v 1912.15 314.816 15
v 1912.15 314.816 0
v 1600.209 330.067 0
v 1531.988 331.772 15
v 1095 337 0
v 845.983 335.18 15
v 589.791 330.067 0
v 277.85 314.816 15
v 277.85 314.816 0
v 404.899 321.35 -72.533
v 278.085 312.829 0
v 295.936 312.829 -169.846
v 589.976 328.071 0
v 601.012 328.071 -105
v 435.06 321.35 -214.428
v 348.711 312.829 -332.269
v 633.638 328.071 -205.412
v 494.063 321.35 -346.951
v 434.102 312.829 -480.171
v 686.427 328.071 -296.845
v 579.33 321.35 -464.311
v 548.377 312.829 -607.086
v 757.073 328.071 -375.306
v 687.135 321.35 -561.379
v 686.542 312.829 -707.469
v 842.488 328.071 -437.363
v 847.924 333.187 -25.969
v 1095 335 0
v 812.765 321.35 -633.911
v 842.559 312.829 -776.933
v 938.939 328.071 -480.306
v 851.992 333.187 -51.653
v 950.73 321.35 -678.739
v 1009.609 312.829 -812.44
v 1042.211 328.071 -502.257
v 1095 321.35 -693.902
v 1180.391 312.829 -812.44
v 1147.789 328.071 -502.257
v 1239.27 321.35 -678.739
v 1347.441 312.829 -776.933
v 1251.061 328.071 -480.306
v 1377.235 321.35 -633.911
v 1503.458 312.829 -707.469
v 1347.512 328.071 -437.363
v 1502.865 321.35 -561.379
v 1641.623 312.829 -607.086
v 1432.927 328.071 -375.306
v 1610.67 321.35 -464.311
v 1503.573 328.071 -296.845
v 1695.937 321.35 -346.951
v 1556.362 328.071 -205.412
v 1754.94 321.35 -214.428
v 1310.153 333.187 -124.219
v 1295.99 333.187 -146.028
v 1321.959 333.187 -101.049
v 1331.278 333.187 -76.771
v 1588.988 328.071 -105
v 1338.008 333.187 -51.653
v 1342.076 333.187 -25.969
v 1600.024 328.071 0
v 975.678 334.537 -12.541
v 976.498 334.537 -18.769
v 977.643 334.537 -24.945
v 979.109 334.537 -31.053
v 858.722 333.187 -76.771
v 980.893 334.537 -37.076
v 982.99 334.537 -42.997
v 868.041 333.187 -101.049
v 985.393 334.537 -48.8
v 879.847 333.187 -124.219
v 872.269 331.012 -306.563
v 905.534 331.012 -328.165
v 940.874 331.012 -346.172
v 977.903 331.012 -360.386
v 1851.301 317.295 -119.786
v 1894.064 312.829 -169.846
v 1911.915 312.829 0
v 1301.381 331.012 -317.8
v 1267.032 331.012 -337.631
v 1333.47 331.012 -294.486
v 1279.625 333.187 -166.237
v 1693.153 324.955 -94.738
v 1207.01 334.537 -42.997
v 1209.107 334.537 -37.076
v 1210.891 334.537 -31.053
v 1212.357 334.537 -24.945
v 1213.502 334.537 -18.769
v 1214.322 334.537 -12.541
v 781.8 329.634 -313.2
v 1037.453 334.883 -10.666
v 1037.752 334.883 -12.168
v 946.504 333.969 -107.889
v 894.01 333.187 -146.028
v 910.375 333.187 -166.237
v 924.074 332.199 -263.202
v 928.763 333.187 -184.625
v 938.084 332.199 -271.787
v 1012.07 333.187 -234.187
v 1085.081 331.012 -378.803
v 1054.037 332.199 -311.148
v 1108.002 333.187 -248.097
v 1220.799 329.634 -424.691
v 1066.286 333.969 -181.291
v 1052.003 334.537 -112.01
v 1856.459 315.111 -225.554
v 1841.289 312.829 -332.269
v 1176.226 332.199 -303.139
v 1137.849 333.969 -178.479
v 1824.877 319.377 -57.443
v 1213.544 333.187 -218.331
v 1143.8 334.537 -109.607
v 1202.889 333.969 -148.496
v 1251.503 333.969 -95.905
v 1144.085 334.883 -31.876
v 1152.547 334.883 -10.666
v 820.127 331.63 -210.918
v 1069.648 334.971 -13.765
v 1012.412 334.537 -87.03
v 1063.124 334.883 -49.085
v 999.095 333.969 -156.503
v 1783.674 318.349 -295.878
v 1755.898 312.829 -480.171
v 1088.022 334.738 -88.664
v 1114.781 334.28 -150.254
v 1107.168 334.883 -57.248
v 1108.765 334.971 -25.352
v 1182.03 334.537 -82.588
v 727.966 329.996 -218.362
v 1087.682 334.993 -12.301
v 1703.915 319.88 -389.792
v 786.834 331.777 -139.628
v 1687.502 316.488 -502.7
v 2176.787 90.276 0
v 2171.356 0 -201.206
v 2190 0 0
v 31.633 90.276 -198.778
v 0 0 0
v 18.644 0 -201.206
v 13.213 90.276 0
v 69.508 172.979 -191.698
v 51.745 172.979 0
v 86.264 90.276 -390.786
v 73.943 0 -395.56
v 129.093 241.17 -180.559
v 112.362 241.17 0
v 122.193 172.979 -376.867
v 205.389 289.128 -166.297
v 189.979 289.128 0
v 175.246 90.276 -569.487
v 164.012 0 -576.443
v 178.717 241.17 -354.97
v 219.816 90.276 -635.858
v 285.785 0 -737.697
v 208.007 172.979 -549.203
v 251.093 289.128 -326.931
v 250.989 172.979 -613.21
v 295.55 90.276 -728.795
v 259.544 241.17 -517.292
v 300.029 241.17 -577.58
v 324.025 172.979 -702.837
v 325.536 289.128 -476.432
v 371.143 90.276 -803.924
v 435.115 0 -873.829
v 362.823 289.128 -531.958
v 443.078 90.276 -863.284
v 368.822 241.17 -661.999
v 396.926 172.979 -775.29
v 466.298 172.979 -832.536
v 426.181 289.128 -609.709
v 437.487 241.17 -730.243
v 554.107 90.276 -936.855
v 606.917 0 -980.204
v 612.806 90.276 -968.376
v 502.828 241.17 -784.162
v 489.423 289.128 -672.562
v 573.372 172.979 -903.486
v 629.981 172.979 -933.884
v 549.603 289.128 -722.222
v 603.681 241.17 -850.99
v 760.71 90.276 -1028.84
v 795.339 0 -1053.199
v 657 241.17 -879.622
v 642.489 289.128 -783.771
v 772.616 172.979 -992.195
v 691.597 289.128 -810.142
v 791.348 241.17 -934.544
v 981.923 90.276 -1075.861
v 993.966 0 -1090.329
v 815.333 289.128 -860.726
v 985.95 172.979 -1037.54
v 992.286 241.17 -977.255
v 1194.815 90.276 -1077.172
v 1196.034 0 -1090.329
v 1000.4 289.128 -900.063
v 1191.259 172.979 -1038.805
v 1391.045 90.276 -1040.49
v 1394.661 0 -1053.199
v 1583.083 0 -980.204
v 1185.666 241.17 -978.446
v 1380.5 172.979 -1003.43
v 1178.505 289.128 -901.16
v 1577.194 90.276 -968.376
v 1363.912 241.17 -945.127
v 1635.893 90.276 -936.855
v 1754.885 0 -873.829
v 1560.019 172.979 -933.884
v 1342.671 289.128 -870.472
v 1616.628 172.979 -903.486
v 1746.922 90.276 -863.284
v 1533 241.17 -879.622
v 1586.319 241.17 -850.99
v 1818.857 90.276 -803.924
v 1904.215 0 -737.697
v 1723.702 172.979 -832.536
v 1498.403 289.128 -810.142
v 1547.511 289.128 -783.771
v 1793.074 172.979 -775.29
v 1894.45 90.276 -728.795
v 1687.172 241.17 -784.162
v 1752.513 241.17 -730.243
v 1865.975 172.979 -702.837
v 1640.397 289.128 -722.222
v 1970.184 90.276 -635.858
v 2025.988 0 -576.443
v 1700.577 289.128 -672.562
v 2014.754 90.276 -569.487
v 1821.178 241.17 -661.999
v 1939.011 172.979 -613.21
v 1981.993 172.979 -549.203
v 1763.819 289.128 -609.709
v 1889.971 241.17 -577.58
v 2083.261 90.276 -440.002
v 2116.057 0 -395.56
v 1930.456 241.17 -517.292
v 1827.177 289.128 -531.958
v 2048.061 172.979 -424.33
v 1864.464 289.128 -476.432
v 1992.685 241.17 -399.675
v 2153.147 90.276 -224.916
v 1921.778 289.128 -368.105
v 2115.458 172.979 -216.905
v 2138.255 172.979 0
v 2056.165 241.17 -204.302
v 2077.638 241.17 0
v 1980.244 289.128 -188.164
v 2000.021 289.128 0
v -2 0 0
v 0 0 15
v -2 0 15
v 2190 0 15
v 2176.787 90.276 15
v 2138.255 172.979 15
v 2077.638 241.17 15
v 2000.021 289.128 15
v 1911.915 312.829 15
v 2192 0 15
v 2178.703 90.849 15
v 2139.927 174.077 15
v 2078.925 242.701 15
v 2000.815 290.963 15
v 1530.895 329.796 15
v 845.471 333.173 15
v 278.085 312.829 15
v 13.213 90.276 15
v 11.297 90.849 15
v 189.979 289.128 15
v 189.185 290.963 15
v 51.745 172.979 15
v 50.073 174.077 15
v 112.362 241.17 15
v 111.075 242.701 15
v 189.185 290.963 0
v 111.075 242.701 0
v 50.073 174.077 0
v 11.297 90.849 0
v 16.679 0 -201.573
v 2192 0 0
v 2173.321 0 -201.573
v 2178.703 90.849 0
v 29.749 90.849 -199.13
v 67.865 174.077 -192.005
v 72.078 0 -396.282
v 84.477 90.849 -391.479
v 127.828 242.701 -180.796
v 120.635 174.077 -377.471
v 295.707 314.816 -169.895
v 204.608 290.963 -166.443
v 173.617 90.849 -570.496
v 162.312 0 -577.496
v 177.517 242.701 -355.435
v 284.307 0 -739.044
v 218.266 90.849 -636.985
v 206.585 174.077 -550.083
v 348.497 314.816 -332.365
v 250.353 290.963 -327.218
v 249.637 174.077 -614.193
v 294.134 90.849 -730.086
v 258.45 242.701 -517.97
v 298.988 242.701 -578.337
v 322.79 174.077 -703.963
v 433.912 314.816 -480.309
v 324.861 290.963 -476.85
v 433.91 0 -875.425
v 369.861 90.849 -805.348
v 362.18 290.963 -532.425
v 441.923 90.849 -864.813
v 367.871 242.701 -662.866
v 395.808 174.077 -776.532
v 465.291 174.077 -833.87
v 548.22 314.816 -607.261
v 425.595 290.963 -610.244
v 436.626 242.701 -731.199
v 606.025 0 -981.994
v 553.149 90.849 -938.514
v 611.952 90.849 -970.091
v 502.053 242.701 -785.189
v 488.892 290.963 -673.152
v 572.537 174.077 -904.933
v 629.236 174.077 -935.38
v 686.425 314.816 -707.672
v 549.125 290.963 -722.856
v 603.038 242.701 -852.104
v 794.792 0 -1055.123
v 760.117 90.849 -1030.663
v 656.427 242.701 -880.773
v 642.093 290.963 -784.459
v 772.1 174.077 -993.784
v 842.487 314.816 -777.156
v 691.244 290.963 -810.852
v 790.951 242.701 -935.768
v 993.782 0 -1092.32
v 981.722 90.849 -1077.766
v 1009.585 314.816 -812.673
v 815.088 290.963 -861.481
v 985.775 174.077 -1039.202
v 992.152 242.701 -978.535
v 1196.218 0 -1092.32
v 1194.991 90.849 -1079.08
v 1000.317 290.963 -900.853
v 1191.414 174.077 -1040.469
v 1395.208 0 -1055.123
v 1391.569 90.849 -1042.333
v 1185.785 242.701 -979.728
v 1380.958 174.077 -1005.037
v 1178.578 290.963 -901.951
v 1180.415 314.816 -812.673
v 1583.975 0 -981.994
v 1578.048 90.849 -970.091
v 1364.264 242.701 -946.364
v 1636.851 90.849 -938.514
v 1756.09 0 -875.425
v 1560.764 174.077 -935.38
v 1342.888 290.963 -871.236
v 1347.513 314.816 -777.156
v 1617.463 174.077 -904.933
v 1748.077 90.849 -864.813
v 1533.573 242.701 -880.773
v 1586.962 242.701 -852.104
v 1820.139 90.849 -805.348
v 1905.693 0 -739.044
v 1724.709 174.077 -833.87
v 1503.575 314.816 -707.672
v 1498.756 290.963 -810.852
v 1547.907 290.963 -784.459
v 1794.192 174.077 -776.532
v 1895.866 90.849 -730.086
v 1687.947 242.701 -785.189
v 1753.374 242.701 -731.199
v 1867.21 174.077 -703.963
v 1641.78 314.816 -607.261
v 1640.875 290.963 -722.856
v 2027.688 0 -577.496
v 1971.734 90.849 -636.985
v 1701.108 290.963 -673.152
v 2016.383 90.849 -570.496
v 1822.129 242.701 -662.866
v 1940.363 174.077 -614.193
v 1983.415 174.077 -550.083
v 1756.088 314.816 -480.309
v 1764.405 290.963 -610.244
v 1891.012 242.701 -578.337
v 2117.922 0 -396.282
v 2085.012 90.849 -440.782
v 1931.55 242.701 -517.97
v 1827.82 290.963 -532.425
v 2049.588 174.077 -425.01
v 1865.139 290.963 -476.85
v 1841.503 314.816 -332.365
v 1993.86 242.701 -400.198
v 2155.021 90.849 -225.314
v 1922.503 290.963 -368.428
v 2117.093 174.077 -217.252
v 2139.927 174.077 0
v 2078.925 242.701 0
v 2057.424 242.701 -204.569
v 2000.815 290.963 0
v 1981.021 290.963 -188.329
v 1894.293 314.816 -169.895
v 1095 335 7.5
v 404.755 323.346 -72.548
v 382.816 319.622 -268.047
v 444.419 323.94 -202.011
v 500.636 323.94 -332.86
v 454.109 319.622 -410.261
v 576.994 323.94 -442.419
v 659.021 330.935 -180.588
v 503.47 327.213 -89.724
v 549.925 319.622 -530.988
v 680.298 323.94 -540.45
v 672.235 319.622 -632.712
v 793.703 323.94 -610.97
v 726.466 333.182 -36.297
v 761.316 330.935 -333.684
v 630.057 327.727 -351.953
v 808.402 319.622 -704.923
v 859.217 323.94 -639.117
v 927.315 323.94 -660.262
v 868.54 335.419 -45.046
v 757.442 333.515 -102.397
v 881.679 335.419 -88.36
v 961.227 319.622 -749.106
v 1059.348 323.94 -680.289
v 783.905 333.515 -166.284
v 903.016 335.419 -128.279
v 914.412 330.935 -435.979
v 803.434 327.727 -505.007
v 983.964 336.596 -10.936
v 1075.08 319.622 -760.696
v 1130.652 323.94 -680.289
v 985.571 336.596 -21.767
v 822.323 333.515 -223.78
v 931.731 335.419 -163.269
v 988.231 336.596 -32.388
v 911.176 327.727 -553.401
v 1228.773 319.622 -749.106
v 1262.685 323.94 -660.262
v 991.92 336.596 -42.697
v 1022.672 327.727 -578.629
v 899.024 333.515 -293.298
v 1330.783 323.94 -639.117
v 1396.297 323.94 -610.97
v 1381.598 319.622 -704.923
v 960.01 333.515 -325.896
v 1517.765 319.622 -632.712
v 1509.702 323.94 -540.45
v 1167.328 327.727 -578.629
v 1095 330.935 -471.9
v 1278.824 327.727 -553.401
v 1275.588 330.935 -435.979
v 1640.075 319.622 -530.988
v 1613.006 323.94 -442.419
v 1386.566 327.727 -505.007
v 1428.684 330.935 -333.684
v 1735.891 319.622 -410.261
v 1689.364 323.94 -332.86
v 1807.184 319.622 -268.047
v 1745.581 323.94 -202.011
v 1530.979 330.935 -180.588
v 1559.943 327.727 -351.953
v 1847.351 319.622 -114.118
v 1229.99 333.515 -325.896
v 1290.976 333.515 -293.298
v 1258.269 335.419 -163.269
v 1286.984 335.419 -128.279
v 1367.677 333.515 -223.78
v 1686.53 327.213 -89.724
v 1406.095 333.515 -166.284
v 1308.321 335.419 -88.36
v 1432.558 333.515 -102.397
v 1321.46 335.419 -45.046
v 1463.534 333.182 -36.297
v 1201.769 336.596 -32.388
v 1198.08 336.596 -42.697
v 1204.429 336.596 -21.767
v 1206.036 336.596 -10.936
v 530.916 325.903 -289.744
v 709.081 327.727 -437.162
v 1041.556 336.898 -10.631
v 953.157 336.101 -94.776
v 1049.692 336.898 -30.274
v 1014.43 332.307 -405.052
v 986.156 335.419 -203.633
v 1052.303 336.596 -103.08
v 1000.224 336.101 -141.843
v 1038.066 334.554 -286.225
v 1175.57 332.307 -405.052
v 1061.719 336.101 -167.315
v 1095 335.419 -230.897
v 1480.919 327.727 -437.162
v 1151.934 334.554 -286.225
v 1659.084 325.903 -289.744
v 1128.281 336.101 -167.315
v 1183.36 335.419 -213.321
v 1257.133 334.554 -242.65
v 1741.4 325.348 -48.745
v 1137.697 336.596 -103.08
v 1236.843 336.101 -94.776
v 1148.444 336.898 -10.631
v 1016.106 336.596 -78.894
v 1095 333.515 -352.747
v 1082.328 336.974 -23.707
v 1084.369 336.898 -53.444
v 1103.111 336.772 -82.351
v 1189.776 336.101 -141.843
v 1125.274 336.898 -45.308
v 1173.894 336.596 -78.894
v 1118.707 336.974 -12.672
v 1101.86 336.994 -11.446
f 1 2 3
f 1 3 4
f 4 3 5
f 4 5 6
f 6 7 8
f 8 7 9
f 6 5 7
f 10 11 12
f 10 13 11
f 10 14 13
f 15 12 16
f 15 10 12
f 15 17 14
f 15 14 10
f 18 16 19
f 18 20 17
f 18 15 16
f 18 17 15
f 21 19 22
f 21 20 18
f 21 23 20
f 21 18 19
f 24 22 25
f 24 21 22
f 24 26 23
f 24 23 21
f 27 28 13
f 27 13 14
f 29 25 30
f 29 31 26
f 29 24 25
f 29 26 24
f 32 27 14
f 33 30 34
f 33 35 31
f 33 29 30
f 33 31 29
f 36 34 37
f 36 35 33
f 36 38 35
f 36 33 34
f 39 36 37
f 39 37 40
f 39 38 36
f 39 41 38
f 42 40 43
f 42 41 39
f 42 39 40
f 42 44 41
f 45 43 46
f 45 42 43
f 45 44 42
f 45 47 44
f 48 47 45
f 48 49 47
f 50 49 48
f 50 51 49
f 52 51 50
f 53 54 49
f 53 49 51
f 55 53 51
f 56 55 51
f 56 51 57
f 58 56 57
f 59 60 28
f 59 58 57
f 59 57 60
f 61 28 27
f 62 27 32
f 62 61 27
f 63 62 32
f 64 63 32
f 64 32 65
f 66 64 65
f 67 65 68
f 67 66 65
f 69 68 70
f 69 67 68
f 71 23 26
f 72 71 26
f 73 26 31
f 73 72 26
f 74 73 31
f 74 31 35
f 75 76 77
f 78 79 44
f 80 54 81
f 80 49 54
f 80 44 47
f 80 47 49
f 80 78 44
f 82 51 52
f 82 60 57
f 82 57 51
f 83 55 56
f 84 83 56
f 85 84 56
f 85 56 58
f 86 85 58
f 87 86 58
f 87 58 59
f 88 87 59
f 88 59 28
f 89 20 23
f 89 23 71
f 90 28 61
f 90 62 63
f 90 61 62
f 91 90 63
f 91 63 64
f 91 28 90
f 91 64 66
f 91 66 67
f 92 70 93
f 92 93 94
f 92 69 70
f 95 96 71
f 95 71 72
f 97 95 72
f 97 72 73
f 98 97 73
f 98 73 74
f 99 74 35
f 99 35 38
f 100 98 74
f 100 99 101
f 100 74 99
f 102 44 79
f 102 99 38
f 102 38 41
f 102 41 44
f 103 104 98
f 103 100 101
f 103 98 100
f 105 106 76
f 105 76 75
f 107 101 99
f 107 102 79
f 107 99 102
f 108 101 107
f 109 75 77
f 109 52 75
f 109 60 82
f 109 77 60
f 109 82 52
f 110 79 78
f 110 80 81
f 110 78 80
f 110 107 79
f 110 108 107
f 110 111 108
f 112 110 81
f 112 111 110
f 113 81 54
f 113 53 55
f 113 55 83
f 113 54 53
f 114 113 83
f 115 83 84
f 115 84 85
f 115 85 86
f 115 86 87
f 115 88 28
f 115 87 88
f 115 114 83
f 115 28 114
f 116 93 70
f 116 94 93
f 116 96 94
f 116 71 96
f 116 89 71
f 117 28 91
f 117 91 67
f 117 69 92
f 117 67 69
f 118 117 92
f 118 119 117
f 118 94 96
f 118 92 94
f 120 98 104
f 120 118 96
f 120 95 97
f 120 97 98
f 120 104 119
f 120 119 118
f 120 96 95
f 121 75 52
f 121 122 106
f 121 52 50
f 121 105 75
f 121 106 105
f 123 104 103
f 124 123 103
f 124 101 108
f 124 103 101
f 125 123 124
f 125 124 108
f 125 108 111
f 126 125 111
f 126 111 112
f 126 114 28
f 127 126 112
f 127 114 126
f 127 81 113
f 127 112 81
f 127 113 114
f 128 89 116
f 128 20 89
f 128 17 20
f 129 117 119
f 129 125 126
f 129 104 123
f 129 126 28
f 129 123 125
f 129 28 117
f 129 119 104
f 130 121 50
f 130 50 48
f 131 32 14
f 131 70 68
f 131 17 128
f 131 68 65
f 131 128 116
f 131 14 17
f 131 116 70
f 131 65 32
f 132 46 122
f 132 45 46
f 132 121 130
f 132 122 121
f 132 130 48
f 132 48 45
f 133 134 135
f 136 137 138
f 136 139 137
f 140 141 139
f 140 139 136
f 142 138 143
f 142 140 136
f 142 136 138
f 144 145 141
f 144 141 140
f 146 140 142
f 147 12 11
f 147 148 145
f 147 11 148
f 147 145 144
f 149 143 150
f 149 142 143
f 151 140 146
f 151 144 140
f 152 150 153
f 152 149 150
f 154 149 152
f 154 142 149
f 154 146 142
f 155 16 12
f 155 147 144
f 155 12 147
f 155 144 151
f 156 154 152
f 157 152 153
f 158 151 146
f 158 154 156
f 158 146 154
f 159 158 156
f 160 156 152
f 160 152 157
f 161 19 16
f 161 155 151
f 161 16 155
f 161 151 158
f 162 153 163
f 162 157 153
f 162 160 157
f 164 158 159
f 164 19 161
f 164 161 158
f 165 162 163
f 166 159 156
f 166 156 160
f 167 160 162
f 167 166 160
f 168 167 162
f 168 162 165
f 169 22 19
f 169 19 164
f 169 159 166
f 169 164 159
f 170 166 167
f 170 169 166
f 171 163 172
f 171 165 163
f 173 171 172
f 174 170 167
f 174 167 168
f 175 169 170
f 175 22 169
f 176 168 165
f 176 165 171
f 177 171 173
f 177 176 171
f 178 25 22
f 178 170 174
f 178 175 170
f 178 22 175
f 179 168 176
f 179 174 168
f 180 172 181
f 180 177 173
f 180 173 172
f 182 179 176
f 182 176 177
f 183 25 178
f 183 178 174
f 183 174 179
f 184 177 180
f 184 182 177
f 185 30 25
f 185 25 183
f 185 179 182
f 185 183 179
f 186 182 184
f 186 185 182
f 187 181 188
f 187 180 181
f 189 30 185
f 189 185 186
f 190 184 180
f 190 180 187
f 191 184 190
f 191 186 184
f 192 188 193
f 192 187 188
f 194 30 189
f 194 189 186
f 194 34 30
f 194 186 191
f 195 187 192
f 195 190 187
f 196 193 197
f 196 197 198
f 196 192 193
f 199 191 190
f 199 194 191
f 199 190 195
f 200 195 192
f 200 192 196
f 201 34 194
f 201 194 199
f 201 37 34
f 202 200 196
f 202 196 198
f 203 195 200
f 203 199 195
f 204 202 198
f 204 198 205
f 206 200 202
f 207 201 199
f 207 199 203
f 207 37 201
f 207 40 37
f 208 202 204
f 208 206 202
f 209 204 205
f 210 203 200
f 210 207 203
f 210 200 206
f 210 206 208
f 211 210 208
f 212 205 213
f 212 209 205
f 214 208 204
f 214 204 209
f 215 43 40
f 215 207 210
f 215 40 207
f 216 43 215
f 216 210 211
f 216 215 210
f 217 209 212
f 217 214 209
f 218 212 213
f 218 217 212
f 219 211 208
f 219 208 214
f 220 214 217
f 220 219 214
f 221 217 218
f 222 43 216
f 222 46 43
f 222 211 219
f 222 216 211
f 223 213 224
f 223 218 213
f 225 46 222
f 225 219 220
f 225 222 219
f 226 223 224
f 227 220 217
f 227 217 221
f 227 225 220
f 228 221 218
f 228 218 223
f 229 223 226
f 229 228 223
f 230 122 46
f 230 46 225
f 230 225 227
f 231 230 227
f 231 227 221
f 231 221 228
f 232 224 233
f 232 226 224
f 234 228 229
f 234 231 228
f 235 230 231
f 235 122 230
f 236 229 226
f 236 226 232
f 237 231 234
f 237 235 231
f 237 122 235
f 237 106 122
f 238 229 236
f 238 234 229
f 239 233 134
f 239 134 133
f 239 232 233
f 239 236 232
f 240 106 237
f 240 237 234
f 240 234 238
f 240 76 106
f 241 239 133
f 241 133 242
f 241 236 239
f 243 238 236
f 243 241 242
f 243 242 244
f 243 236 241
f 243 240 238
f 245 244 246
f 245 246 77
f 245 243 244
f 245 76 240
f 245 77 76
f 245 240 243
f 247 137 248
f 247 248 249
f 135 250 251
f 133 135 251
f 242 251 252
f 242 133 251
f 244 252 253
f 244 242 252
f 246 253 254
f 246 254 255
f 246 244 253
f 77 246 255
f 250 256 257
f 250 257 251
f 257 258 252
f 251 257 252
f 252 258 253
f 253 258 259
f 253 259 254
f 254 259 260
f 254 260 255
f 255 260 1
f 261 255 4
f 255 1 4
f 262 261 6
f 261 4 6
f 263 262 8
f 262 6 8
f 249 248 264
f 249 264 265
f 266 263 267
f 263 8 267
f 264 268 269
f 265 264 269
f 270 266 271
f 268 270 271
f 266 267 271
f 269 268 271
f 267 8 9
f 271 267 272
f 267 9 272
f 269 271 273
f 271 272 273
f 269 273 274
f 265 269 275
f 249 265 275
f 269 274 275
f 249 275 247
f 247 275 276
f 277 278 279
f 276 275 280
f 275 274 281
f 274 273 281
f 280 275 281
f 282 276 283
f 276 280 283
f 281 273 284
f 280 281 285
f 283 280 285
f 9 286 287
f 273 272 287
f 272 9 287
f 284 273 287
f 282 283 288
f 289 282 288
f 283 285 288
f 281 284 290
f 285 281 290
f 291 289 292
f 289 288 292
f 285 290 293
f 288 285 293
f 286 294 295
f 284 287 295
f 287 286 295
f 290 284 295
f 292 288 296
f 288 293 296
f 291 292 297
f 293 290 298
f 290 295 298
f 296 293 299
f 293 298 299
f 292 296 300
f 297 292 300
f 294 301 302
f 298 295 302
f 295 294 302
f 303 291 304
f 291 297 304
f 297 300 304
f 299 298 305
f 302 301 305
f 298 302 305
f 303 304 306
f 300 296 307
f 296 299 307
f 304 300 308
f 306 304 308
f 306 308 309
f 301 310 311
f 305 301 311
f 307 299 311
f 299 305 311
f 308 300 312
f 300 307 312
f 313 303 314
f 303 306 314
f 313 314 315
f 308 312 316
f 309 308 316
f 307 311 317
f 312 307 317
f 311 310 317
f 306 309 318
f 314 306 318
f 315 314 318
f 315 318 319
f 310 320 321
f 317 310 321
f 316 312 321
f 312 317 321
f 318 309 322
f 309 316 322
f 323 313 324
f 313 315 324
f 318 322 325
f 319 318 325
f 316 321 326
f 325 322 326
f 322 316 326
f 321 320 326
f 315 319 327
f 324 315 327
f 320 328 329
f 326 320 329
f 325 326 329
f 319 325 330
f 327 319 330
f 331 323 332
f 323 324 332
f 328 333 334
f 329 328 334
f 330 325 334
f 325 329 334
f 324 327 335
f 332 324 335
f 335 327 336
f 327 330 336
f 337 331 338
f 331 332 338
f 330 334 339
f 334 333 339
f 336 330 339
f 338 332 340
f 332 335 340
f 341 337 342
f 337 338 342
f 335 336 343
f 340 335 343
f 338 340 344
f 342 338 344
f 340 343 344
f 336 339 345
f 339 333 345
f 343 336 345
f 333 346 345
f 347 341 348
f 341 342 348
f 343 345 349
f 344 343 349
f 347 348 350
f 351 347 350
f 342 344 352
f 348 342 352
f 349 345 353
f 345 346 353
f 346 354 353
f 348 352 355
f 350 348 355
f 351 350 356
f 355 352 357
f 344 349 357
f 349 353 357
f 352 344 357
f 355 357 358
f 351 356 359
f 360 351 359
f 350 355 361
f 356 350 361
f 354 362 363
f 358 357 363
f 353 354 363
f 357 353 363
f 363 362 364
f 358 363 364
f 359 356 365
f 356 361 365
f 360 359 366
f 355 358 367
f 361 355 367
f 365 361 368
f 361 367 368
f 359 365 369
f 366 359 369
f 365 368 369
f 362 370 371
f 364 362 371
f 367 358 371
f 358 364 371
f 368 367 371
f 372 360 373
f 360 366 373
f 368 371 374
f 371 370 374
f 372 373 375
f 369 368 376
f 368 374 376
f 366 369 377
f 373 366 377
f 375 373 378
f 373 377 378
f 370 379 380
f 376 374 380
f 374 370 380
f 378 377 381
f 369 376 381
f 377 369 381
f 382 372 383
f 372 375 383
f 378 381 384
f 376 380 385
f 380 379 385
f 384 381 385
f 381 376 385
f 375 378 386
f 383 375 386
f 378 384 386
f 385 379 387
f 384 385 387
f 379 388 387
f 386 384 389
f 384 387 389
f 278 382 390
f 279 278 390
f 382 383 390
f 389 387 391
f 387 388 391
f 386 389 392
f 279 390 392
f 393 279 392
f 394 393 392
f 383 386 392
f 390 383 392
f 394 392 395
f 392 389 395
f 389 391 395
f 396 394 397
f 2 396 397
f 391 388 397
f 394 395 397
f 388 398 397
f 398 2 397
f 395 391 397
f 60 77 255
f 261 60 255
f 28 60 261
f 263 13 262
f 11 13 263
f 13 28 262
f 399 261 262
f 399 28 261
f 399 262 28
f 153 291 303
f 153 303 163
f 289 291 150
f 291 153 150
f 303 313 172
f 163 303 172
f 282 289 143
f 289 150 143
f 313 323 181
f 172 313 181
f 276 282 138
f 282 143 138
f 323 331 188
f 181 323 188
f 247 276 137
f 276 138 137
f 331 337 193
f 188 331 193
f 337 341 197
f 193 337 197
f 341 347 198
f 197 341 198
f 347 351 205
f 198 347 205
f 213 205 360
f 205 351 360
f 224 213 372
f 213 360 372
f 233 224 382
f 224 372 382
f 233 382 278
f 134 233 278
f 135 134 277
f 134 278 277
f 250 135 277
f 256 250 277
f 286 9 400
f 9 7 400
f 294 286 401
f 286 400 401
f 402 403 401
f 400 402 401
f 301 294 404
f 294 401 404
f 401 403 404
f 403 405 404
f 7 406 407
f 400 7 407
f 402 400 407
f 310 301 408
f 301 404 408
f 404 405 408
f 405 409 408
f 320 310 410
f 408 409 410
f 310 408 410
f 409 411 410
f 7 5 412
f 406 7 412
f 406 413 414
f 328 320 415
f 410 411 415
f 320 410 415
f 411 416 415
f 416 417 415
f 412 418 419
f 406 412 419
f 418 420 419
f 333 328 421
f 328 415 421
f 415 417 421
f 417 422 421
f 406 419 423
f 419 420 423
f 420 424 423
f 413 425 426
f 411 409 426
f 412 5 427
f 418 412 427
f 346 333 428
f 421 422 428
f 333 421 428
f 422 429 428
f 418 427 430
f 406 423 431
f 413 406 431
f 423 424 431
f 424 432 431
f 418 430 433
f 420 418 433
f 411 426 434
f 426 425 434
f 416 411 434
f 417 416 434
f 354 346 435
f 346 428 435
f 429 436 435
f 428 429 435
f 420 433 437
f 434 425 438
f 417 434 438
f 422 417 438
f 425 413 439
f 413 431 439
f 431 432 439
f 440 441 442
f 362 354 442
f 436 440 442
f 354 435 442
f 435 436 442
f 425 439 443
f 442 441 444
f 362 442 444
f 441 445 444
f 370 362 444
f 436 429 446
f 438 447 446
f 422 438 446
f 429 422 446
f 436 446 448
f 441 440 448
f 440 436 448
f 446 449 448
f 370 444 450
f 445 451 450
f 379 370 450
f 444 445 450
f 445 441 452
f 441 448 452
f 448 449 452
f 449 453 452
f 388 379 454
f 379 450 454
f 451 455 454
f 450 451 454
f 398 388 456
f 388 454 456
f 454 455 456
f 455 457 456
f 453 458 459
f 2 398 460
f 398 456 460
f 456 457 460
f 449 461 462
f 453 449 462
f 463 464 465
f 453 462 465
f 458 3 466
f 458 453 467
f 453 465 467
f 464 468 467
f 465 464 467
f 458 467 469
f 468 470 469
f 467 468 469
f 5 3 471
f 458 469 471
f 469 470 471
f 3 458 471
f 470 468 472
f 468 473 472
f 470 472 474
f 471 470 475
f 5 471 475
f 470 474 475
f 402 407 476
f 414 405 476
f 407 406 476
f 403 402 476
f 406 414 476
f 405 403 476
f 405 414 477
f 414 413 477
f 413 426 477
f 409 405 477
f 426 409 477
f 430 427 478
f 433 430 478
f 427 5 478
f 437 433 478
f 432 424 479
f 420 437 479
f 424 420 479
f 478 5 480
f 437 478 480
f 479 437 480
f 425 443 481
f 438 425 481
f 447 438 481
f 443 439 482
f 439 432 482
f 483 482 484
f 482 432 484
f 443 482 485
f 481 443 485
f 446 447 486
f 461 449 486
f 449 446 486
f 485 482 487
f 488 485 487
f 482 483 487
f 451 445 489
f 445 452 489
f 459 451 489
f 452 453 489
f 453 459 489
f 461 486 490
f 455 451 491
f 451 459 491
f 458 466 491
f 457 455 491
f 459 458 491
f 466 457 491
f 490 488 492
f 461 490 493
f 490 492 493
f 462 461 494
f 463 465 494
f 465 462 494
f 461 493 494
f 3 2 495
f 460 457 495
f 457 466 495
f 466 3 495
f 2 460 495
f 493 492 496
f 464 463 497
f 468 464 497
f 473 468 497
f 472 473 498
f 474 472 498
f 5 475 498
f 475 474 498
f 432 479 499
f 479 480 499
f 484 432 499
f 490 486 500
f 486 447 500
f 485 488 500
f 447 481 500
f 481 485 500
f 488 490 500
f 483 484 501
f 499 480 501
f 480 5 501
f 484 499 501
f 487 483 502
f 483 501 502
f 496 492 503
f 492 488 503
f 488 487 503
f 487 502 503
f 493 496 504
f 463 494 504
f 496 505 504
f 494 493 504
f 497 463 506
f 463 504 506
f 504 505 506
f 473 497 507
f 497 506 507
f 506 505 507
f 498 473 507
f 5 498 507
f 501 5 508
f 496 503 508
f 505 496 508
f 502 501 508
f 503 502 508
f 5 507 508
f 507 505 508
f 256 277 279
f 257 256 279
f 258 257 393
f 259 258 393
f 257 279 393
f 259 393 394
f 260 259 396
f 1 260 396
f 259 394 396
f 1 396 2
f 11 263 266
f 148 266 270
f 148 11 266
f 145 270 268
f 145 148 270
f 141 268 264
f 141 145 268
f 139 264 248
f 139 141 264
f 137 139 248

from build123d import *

# Parameters (mm, degrees)
SURFACE_REVOLVE1_2_ANGLE = 180
SURFACE_EXTRUDE1_3_DEPTH = 15
THICKEN1_T2              = 2


with BuildPart() as body_1:
    # Surface-Revolve1: a surface, the sketch's curves turned about an axis by 180 degrees
    with BuildLine(Plane.XY, mode=Mode.PRIVATE) as surface_revolve1_2_path:
        ThreePointArc((0, 0), (79.571296782, 209.280495271), (278.084607626, 312.829432448))
        add(Edge.make_bspline(
            [(278.084607626, 312.829432448), (391.549286988, 326.218815687), (812.489449679, 335), (1095, 335)],
            knots=[0, 0, 0, 0, 1, 1, 1, 1], degree=3))
    surface_revolve1_2 = Shell.revolve(surface_revolve1_2_path.wire(), SURFACE_REVOLVE1_2_ANGLE, Axis((1095, 335, 0), (0, -1, 0)))
    # Surface-Extrude1: a surface, the sketch's curves swept straight by 15 mm
    with BuildLine(Plane.XY, mode=Mode.PRIVATE) as surface_extrude1_3_path:
        ThreePointArc((2190, 0), (2110.428703218, 209.280495271), (1911.915392374, 312.829432448))
        add(Edge.make_bspline(
            [(1911.915392374, 312.829432448), (1798.450713012, 326.218815687), (1377.510550321, 335), (1095, 335)],
            knots=[0, 0, 0, 0, 1, 1, 1, 1], degree=3))
        add(Edge.make_bspline(
            [(1095, 335), (812.489449679, 335), (391.549286988, 326.218815687), (278.084607626, 312.829432448)],
            knots=[0, 0, 0, 0, 1, 1, 1, 1], degree=3))
        ThreePointArc((278.084607626, 312.829432448), (79.571296782, 209.280495271), (0, 0))
    surface_extrude1_3 = Shell.extrude(surface_extrude1_3_path.wire(), (0 * SURFACE_EXTRUDE1_3_DEPTH, 0 * SURFACE_EXTRUDE1_3_DEPTH, 1 * SURFACE_EXTRUDE1_3_DEPTH))
    # Surface-Knit1: the surfaces knitted into one
    surface_knit1_1 = Shell(Face.sew_faces(surface_revolve1_2.faces() + surface_extrude1_3.faces())[0])
    add(Solid.thicken(surface_knit1_1, -THICKEN1_T2))


solid = body_1.part
